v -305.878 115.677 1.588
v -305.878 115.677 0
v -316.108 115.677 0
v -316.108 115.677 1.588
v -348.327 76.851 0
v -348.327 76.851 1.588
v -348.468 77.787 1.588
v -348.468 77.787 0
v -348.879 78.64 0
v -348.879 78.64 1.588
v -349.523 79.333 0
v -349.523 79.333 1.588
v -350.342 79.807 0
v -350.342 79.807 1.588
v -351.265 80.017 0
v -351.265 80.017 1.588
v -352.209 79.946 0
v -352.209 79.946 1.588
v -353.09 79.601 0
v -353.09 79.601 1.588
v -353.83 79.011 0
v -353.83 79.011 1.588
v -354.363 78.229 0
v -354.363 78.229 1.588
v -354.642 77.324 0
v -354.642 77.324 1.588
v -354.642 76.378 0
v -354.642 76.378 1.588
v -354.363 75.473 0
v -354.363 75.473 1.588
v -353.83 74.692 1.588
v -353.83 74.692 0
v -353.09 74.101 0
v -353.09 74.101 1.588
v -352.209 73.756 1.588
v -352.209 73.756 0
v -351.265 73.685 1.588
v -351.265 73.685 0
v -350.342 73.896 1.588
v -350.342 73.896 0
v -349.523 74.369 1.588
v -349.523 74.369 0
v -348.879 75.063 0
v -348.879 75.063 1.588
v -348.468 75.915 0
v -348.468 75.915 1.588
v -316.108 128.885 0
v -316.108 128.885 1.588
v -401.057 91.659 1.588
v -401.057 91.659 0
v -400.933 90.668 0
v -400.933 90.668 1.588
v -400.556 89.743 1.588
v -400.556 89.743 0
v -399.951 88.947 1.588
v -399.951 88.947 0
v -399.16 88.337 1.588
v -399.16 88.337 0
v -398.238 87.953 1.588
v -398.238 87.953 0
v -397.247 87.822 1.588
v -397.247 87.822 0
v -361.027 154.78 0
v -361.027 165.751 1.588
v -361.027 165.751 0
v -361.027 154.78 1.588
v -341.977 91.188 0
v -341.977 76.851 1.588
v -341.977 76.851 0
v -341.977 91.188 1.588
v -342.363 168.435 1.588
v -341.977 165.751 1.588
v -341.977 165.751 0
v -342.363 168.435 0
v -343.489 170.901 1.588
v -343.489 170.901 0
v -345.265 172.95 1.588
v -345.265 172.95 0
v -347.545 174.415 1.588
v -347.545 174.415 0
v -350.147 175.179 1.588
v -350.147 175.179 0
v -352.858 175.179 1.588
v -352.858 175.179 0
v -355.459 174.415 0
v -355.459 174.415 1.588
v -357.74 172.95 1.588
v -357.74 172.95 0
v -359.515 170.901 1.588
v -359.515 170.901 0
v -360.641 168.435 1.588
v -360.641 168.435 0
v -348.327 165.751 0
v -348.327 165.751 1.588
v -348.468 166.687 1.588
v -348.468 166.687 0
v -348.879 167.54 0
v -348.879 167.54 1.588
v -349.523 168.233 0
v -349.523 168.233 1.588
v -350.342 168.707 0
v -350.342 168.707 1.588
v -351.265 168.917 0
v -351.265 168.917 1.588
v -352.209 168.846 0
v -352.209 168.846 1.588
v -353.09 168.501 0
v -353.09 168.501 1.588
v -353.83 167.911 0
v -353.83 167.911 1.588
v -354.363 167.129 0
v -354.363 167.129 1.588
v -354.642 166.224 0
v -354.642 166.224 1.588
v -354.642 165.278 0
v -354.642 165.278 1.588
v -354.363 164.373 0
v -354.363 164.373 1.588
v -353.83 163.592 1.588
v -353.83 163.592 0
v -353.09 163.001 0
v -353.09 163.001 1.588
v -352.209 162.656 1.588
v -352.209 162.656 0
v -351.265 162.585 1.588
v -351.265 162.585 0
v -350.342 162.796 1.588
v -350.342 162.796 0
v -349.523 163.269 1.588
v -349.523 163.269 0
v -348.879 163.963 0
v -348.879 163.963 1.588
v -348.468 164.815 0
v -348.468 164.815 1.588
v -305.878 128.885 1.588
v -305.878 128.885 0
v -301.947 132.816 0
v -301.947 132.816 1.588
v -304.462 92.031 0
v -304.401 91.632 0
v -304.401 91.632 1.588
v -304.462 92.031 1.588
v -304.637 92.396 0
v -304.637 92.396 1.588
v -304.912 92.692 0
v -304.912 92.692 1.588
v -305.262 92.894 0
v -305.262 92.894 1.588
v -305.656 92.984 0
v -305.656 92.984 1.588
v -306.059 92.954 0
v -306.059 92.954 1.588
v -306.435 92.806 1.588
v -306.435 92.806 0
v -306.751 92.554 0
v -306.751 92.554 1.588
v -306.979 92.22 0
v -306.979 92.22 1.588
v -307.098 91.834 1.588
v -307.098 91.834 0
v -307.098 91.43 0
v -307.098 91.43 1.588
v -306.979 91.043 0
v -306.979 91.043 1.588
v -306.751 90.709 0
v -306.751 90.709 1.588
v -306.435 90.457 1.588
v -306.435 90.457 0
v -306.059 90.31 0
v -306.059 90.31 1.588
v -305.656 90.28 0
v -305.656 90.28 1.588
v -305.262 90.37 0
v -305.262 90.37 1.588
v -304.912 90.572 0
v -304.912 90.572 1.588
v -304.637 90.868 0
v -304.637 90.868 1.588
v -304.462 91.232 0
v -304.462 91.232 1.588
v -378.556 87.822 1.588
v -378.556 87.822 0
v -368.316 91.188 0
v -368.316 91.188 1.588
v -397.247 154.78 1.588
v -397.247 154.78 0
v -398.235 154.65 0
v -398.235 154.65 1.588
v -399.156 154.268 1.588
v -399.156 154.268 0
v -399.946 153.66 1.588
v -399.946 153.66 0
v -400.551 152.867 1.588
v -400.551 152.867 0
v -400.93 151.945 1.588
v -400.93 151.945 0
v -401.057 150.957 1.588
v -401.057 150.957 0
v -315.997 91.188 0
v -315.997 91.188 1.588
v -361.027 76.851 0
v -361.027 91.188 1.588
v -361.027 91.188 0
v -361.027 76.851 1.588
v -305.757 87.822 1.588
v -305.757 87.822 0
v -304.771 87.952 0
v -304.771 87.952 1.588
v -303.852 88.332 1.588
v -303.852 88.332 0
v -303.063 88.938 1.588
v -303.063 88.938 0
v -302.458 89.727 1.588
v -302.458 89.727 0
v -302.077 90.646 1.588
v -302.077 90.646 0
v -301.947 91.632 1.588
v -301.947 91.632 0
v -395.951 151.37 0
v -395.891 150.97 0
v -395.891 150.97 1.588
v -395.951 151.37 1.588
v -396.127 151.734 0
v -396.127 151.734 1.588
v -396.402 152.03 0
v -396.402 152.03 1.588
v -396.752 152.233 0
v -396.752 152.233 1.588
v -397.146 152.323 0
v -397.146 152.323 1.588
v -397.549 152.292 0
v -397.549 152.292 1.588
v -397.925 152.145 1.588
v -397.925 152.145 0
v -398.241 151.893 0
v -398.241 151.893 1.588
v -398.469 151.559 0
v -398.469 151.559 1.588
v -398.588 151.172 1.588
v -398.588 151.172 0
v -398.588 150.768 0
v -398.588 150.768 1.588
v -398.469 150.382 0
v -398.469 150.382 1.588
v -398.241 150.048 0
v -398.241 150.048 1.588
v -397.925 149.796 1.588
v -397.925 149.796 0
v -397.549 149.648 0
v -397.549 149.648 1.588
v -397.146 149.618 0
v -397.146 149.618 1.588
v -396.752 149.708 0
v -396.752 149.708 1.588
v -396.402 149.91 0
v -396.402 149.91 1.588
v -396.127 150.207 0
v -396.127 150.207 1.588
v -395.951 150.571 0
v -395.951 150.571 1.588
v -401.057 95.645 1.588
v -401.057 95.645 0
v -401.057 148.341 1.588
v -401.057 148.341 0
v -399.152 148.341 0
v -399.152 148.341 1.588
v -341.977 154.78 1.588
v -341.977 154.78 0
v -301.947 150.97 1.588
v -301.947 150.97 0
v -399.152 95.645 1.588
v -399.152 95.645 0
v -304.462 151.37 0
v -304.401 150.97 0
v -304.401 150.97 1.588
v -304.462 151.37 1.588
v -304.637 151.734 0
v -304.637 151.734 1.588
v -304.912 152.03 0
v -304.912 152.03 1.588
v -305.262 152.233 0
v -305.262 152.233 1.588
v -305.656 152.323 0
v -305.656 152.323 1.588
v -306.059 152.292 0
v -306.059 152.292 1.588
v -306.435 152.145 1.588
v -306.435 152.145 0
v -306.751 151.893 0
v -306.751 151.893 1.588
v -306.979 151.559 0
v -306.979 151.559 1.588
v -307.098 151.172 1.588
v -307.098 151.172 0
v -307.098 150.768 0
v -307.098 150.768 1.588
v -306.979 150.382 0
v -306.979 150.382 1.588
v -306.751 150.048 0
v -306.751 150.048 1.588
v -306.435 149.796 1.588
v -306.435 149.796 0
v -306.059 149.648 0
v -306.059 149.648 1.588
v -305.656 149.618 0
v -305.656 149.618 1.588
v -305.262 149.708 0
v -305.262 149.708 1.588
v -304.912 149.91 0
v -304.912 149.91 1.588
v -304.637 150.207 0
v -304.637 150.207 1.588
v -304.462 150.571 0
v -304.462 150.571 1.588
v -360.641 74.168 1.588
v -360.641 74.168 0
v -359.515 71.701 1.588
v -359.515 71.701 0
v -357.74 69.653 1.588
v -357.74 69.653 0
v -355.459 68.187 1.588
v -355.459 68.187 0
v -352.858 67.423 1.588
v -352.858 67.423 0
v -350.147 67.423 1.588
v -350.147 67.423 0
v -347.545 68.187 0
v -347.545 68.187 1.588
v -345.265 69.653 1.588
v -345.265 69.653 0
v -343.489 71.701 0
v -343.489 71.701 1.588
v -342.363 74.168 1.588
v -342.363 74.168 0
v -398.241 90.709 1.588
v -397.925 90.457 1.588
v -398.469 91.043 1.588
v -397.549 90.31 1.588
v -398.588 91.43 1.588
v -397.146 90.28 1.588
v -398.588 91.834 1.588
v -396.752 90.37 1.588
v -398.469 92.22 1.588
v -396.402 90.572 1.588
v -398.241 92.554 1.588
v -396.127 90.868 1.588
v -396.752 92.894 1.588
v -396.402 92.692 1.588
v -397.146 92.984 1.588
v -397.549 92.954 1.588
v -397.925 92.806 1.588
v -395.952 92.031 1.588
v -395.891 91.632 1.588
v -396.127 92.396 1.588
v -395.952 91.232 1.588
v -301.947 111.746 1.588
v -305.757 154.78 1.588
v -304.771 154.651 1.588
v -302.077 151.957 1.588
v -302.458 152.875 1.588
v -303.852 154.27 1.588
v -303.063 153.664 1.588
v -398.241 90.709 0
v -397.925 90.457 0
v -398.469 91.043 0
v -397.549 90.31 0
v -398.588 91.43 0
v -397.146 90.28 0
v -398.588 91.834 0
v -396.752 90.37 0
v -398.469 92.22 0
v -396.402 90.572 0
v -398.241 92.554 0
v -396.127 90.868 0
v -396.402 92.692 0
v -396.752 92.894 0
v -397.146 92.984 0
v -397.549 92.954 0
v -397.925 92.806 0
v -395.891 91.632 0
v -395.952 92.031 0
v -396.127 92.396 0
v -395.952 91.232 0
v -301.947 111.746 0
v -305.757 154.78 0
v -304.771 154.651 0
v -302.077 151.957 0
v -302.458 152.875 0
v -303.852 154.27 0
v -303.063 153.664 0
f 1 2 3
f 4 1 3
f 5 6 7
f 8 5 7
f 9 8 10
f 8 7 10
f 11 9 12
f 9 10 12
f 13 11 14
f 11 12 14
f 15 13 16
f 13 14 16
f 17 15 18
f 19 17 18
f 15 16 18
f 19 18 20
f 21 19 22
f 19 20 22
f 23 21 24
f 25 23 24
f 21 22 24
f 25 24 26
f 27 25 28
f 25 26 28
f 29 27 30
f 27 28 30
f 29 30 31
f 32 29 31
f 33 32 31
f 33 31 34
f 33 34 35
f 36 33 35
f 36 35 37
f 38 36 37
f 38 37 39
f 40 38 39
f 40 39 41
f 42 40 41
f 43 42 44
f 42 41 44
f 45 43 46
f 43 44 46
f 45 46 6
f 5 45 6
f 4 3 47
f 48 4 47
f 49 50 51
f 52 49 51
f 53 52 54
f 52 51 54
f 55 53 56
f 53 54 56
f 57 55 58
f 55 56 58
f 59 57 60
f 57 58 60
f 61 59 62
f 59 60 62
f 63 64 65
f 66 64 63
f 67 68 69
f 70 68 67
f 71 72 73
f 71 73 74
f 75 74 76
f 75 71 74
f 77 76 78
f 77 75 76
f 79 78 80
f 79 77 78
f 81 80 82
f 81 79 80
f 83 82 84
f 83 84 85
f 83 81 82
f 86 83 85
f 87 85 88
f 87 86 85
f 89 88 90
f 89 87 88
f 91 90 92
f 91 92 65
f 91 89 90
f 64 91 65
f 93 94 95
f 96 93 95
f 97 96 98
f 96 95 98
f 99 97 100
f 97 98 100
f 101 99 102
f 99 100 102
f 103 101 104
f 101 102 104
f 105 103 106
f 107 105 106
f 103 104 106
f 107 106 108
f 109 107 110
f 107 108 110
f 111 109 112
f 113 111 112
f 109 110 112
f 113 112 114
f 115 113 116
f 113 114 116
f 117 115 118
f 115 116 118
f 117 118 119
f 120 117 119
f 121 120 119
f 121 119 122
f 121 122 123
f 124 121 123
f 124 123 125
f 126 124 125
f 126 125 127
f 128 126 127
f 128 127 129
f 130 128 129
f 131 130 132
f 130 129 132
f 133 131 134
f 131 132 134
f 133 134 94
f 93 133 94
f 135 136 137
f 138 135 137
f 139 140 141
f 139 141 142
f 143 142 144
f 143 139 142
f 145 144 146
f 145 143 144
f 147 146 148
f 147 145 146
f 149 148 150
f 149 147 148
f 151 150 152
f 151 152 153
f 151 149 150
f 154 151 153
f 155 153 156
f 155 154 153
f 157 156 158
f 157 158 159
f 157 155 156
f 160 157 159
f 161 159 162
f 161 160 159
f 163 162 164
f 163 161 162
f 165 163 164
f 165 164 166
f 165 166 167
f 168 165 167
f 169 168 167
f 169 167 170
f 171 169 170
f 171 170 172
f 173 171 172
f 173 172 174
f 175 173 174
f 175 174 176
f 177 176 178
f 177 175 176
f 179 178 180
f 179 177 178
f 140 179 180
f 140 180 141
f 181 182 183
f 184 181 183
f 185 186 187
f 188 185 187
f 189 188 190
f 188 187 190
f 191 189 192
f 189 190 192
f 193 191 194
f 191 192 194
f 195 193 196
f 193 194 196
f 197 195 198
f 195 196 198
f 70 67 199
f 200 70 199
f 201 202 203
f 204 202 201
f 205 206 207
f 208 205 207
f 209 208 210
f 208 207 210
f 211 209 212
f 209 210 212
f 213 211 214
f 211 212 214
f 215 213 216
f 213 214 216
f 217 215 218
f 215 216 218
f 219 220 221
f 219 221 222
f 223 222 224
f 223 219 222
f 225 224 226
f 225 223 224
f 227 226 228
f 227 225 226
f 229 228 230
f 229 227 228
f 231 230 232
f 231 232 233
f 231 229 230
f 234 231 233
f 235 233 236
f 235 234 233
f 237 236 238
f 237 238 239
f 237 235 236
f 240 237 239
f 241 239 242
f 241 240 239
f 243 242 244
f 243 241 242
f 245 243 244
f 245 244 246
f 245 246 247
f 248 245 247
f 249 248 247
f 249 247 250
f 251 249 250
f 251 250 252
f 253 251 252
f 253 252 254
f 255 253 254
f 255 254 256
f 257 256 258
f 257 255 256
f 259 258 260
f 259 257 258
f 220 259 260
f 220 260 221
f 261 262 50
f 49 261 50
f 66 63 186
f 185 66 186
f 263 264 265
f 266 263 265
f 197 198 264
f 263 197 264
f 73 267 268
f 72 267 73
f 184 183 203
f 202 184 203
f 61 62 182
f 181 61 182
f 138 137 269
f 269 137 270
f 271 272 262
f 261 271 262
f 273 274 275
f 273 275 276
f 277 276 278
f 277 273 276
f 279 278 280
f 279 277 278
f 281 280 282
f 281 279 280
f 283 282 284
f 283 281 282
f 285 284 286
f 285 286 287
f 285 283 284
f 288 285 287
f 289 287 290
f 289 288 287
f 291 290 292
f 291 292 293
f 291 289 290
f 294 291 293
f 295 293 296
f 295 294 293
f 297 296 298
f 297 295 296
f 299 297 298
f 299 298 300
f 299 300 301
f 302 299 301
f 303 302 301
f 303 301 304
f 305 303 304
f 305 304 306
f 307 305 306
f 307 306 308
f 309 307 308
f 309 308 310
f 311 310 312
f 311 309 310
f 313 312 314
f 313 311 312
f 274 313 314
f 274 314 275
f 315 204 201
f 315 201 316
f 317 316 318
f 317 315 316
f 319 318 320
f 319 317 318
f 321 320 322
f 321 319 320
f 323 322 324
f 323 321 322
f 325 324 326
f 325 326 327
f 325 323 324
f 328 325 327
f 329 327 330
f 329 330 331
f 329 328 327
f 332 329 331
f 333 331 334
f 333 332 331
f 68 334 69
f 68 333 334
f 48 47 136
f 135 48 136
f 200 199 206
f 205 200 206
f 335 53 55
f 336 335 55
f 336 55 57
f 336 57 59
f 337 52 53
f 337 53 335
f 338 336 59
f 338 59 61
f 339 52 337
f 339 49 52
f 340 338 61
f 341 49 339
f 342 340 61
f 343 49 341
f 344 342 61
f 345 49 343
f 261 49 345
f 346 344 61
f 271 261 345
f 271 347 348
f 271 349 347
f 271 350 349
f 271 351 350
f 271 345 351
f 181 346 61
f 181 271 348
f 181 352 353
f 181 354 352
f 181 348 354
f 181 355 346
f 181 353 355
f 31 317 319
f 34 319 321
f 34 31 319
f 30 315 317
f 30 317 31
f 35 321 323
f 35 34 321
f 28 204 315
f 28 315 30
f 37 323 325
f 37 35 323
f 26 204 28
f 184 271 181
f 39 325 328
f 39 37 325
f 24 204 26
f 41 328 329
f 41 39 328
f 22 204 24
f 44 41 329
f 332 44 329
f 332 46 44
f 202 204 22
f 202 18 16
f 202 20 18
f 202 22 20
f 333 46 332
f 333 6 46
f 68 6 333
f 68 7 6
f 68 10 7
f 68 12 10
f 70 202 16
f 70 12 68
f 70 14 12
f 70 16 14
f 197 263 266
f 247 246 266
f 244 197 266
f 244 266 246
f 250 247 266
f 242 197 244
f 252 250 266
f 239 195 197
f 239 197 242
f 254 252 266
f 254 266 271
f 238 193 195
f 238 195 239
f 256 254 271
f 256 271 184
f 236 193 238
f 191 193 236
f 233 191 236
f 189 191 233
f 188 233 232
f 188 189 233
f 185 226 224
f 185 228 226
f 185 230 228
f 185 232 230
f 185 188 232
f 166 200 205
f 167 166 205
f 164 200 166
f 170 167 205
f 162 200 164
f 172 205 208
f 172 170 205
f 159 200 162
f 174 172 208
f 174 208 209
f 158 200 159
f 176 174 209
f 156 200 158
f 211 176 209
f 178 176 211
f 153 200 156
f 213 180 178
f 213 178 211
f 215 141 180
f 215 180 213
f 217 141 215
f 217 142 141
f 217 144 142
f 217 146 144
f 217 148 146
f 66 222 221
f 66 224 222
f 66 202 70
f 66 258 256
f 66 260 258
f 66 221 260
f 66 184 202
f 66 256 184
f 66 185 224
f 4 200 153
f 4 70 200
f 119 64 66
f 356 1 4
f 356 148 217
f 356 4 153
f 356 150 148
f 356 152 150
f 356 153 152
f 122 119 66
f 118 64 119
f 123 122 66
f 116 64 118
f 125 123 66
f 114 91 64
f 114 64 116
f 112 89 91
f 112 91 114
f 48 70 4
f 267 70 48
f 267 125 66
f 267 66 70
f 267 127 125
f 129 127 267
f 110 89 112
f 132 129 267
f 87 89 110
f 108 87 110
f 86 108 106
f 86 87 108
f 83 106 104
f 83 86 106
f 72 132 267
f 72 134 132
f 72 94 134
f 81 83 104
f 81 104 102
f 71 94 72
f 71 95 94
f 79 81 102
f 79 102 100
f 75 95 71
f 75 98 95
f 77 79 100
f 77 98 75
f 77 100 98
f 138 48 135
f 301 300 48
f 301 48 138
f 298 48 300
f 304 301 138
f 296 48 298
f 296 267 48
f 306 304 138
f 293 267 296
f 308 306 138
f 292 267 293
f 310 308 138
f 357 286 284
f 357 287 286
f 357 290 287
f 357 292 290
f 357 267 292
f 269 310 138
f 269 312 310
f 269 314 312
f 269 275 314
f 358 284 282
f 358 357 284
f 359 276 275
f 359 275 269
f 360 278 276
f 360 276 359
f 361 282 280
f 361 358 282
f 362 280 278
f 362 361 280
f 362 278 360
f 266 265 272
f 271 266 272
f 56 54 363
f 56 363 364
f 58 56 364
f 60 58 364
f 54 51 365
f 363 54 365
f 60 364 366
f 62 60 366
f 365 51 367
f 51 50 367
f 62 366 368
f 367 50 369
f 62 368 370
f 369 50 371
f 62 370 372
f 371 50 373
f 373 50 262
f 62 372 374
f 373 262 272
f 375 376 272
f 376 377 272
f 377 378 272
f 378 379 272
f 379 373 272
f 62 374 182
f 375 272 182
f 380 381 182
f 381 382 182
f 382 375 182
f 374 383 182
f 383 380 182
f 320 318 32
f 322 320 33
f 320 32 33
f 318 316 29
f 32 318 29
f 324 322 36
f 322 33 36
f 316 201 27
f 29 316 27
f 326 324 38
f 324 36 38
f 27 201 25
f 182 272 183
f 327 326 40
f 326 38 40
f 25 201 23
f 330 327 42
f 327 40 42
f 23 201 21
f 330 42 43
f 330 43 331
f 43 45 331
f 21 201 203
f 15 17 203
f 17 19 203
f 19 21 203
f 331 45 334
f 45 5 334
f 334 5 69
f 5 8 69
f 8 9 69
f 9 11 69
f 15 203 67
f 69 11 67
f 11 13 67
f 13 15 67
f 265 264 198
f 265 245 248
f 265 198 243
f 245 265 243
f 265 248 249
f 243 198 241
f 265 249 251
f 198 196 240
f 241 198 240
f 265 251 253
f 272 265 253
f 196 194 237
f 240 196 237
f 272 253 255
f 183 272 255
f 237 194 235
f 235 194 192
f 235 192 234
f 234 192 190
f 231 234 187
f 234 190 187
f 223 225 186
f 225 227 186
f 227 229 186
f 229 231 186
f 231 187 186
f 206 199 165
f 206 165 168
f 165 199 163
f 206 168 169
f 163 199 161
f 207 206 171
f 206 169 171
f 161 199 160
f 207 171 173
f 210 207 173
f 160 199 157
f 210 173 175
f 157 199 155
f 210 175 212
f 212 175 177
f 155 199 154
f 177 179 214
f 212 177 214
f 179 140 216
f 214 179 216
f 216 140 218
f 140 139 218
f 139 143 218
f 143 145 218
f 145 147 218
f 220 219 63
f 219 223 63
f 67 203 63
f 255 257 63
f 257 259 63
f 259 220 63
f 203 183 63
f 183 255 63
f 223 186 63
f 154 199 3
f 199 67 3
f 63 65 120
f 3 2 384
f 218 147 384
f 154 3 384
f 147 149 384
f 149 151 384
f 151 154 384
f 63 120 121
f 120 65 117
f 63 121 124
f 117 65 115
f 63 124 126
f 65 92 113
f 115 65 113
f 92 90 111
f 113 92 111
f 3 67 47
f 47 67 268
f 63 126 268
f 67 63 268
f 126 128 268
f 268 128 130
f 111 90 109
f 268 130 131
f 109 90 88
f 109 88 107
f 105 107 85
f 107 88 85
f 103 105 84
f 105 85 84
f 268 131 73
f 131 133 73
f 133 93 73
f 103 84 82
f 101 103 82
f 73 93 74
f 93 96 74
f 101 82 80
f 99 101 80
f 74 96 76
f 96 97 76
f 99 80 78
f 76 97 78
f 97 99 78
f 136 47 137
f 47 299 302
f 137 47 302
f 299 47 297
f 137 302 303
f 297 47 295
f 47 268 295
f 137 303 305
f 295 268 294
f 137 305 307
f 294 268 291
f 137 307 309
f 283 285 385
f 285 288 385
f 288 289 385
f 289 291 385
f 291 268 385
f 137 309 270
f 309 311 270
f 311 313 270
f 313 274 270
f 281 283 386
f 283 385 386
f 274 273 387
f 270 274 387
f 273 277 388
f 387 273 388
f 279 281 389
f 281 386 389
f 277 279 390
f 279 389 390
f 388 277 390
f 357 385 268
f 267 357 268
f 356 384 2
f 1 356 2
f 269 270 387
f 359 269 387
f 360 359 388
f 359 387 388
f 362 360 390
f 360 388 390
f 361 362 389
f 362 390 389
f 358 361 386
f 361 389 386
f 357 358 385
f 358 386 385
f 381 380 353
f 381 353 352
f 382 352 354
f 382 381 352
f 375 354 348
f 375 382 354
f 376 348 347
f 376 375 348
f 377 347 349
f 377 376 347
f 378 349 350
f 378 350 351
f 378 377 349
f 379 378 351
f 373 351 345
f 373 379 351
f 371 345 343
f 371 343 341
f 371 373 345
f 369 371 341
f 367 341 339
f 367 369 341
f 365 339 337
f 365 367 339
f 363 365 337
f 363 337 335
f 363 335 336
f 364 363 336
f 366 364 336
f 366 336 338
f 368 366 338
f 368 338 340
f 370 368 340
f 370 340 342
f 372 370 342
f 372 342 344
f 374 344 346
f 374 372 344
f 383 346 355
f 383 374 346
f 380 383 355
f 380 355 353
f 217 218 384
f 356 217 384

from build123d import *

# Parameters (mm, degrees)
SKETCH1_R           = 1.355900406
BOSS_EXTRUDE1_DEPTH = 1.5875
SKETCH2_R           = 3.175
BOSS_EXTRUDE2_DEPTH = 1.5875


with BuildPart() as part:
    # Sketch1 → Boss-Extrude1 (new body)
    with BuildSketch(Plane.XY):
        with BuildLine():
            Line((-301.9473, 111.74645), (-305.87795, 115.6771))
            Line((-305.87795, 115.6771), (-316.1078, 115.6771))
            Line((-316.1078, 115.6771), (-316.1078, 128.8851))
            Line((-316.1078, 128.8851), (-305.87795, 128.8851))
            Line((-305.87795, 128.8851), (-301.9473, 132.81575))
            Line((-301.9473, 132.81575), (-301.9473, 150.9704))
            ThreePointArc((-301.9473, 150.9704), (-303.063223164, 153.664476836), (-305.7573, 154.7804))
            Line((-305.7573, 154.7804), (-397.247125, 154.7804))
            ThreePointArc((-397.247125, 154.7804), (-399.946077222, 153.659592612), (-401.0571, 150.956597849))
            Line((-401.0571, 150.956597849), (-401.0571, 148.341))
            Line((-401.0571, 148.341), (-399.1521, 148.341))
            Line((-399.1521, 148.341), (-399.1521, 95.6449))
            Line((-399.1521, 95.6449), (-401.0571, 95.6449))
            Line((-401.0571, 95.6449), (-401.0571, 91.659304166))
            ThreePointArc((-401.0571, 91.659304166), (-399.951018769, 88.947400452), (-397.2472, 87.8217))
            Line((-397.2472, 87.8217), (-378.5565, 87.8217))
            Line((-378.5565, 87.8217), (-368.3165, 91.1883))
            Line((-368.3165, 91.1883), (-315.9973, 91.1883))
            Line((-315.9973, 91.1883), (-305.7573, 87.8217))
            ThreePointArc((-305.7573, 87.8217), (-303.063223164, 88.937623164), (-301.9473, 91.6317))
            Line((-301.9473, 91.6317), (-301.9473, 111.74645))
        make_face()
        with Locations((-305.7573, 91.6317)):
            Circle(SKETCH1_R, mode=Mode.SUBTRACT)
        with Locations((-305.7573, 150.9704)):
            Circle(SKETCH1_R, mode=Mode.SUBTRACT)
        with Locations((-397.247125, 150.9704)):
            Circle(SKETCH1_R, mode=Mode.SUBTRACT)
        with Locations((-397.2472, 91.6317)):
            Circle(SKETCH1_R, mode=Mode.SUBTRACT)
    extrude(amount=BOSS_EXTRUDE1_DEPTH)

    # Sketch2 → Boss-Extrude2 (add)
    # profile 1 of 2: a face of its own
    with BuildSketch(Plane.XY.offset(1.5875)):
        with BuildLine():
            Line((-361.0272, 165.75105), (-361.0272, 154.7804))
            Line((-361.0272, 154.7804), (-341.9772, 154.7804))
            Line((-341.9772, 154.7804), (-341.9772, 165.75105))
            ThreePointArc((-341.9772, 165.75105), (-351.5022, 175.27605), (-361.0272, 165.75105))
        make_face()
        with Locations((-351.5022, 165.75105)):
            Circle(SKETCH2_R, mode=Mode.SUBTRACT)
    # profile 2 of 2: a face of its own
    with BuildSketch(Plane.XY.offset(1.5875)):
        with BuildLine():
            Line((-341.9772, 91.1883), (-361.0272, 91.1883))
            Line((-361.0272, 91.1883), (-361.0272, 76.85105))
            ThreePointArc((-361.0272, 76.85105), (-351.5022, 67.32605), (-341.9772, 76.85105))
            Line((-341.9772, 76.85105), (-341.9772, 91.1883))
        make_face()
        with Locations((-351.5022, 76.85105)):
            Circle(SKETCH2_R, mode=Mode.SUBTRACT)
    extrude(amount=-BOSS_EXTRUDE2_DEPTH)


solid = part.part
